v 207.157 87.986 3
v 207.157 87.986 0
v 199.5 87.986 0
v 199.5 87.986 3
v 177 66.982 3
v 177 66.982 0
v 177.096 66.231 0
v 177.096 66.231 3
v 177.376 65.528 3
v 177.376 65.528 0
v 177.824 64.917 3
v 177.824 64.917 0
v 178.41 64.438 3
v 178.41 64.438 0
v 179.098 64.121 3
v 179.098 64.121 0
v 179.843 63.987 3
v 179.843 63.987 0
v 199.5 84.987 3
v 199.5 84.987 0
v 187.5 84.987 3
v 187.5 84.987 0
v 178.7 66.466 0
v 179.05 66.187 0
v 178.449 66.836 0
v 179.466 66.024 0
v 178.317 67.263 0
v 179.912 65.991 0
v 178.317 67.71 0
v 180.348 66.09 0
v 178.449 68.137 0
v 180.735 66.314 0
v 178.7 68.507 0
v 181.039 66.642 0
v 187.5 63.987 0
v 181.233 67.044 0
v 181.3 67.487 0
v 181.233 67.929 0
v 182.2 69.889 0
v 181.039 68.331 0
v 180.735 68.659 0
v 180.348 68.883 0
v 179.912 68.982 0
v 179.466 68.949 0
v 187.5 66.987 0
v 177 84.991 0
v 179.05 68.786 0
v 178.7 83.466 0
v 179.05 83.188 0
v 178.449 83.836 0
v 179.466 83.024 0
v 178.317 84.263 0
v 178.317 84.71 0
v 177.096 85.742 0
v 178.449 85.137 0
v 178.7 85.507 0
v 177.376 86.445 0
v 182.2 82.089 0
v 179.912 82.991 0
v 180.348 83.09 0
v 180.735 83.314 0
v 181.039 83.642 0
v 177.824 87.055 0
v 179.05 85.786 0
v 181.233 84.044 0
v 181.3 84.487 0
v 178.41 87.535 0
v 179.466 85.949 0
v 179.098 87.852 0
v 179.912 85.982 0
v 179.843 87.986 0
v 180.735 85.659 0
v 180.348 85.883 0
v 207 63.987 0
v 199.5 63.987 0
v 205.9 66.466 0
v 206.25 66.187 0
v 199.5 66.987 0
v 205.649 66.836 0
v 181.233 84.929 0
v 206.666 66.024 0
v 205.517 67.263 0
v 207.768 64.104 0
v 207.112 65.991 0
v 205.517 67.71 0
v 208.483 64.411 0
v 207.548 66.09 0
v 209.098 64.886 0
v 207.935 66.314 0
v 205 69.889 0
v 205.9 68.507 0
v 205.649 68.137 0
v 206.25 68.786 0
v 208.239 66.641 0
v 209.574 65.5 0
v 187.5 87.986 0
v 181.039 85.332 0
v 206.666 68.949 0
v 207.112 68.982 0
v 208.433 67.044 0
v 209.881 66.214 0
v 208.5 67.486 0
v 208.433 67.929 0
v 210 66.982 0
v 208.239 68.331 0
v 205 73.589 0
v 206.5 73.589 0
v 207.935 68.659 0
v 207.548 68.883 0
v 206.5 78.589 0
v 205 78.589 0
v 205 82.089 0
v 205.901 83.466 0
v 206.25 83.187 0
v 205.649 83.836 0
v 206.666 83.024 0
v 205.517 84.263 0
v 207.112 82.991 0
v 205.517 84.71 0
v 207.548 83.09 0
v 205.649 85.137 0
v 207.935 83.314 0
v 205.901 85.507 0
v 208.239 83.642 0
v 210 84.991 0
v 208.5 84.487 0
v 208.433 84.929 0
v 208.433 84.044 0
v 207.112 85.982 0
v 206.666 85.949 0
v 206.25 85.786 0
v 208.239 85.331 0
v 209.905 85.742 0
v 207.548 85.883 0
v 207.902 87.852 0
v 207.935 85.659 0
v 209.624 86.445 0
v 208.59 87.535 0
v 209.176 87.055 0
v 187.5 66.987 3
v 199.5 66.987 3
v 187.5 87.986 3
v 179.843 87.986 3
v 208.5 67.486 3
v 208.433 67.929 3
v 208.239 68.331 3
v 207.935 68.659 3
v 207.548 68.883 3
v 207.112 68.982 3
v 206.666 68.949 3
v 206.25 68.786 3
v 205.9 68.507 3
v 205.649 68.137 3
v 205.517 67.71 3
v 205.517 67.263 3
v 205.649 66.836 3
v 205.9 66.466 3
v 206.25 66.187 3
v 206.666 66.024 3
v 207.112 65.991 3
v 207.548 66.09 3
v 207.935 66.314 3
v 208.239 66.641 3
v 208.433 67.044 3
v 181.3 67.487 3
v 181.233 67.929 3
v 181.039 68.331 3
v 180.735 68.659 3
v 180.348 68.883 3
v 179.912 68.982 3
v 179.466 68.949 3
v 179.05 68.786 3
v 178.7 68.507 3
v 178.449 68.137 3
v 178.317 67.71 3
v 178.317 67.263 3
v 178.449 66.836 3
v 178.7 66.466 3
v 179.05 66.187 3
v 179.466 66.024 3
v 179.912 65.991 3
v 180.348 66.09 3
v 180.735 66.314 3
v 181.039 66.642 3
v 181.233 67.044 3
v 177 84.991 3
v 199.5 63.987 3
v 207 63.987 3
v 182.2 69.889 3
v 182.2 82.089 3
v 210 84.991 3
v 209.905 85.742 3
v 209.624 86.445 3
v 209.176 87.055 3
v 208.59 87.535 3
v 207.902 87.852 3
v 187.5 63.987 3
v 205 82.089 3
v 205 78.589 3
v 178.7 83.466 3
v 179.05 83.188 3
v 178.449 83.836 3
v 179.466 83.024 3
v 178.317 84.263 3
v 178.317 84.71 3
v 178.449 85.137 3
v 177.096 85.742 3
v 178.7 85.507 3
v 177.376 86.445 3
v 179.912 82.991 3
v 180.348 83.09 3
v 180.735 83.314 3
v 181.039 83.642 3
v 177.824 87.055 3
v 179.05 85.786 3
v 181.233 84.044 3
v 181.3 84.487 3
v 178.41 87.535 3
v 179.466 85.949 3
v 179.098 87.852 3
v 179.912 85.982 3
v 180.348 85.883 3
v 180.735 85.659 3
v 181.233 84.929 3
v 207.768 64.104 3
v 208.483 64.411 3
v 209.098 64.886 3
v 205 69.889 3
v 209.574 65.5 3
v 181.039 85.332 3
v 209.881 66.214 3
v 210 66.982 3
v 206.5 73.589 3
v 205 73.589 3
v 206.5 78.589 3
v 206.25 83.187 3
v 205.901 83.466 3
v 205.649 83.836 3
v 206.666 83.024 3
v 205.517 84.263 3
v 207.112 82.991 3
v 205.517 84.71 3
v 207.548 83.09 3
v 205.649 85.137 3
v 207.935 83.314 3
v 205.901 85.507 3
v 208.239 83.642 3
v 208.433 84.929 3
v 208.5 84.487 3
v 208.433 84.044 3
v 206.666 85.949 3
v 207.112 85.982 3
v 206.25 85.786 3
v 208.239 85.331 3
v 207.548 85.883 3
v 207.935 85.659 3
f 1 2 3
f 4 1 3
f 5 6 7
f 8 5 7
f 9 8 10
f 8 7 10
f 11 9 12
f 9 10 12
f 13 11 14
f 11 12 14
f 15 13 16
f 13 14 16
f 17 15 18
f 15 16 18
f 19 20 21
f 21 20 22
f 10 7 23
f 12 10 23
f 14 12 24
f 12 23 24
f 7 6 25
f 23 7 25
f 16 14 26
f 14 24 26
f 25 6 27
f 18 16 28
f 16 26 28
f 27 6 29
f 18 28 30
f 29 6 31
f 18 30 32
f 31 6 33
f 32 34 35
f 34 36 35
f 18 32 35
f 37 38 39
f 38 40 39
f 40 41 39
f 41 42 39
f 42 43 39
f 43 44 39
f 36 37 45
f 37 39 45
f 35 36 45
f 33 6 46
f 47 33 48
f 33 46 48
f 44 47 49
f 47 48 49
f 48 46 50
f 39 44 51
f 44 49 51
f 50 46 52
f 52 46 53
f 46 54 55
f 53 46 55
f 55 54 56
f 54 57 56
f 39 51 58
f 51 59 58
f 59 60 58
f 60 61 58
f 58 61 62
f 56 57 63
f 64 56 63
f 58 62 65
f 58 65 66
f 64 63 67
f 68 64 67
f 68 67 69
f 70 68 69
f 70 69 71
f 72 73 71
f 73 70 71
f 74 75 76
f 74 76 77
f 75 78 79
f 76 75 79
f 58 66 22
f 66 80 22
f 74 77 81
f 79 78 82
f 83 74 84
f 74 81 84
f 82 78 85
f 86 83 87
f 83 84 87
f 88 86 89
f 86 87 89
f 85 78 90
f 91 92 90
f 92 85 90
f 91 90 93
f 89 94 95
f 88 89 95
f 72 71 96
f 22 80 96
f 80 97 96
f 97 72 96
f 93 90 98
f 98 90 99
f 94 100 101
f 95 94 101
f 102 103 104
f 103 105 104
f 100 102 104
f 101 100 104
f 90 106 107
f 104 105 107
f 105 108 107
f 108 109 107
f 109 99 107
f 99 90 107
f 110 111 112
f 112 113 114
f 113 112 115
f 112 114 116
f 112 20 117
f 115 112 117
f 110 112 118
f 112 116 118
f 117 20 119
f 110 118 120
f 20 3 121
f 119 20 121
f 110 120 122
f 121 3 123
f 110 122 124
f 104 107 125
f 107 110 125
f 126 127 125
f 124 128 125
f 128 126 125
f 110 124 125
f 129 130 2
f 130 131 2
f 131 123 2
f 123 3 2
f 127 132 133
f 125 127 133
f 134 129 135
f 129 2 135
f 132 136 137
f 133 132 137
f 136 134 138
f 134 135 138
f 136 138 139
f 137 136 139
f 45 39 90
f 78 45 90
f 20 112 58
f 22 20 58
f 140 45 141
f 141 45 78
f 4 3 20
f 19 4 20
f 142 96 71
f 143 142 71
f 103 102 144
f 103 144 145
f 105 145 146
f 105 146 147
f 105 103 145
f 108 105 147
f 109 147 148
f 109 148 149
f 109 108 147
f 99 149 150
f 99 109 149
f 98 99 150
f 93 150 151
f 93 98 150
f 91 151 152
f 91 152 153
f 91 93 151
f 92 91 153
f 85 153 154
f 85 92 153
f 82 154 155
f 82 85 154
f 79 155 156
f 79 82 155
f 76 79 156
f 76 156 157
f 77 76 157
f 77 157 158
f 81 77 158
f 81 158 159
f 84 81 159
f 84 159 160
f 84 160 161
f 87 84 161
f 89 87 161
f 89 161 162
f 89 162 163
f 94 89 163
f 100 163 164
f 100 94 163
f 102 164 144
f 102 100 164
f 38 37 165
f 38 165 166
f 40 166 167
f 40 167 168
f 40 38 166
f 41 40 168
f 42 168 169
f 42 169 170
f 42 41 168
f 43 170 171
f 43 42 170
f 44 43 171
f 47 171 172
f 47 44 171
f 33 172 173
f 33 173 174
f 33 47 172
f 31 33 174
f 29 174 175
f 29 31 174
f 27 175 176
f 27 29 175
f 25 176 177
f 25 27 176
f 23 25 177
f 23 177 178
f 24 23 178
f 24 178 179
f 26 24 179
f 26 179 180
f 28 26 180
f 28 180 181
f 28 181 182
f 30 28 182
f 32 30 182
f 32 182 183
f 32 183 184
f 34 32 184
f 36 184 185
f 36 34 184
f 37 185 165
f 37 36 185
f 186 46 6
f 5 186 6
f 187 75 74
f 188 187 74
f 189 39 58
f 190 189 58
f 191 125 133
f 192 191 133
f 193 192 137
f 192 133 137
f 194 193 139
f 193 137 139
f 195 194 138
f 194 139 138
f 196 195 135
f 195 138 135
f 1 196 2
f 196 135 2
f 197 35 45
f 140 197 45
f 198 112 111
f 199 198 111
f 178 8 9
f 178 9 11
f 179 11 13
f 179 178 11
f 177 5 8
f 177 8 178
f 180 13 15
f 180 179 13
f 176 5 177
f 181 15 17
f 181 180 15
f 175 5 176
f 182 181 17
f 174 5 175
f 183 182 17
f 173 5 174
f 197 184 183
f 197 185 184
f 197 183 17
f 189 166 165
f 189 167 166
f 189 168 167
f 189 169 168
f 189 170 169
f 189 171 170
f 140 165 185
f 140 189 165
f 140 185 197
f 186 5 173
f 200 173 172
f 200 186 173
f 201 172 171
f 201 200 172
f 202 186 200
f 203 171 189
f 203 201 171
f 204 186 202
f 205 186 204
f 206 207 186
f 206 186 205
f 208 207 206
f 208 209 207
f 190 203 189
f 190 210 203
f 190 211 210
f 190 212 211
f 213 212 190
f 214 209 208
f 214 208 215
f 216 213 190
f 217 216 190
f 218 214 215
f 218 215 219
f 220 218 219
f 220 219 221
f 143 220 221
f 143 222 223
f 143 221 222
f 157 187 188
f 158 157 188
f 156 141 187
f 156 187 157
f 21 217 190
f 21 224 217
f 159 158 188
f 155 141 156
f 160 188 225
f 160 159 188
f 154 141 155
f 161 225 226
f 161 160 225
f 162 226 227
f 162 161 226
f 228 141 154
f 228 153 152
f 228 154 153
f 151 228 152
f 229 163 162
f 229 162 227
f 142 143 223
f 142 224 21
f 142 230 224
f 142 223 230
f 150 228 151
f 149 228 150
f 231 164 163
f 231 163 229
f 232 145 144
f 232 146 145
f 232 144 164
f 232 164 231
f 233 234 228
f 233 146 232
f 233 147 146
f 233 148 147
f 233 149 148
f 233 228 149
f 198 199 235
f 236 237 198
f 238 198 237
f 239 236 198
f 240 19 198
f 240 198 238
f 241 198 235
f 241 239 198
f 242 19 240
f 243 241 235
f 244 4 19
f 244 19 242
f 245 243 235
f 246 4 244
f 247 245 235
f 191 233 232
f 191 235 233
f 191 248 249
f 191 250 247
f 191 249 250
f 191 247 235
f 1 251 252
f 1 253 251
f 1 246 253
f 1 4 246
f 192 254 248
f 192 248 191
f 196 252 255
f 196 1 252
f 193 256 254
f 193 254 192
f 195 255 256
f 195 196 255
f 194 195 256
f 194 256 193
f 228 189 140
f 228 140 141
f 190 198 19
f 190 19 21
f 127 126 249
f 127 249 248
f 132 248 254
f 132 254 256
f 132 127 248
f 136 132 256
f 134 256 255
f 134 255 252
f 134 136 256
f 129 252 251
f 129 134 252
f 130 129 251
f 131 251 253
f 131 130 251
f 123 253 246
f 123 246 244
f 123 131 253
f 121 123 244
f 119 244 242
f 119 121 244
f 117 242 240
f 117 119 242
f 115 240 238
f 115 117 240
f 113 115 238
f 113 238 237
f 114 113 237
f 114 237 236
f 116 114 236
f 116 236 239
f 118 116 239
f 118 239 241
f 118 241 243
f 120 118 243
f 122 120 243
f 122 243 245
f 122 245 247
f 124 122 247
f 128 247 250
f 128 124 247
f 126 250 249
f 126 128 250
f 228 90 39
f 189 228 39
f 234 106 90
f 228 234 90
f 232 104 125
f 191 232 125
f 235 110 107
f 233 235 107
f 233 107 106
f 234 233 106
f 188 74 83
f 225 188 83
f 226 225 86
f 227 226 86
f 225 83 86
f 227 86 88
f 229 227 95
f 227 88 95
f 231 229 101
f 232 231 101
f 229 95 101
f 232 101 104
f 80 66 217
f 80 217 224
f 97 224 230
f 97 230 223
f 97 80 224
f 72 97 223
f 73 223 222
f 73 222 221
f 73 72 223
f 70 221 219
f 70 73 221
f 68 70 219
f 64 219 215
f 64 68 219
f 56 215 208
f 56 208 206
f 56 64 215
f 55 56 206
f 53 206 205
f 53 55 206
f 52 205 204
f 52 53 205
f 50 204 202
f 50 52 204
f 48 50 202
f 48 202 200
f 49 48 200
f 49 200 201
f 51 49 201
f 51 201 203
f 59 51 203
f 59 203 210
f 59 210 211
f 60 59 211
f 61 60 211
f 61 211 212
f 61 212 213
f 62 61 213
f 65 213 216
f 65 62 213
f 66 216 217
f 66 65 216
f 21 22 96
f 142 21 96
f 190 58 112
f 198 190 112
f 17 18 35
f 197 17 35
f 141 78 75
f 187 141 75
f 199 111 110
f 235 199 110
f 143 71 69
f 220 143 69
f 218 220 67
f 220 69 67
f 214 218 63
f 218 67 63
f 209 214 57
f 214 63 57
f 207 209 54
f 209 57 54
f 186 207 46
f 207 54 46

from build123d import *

# Parameters (mm, degrees)
SKETCH_1_R      = 1.500000002
SKETCH_1_R_2    = 1.5
SKETCH_1_R_3    = 1.500000008
EXTRUDE_1_DEPTH = 3


with BuildPart() as part:
    # 草圖1 → 填料-伸長1 (new body)
    with BuildSketch(Plane.XY):
        with BuildLine():
            Line((199.500112684, 87.98631657), (199.500112684, 84.98651657))
            Line((199.500112684, 84.98651657), (187.500112684, 84.98651657))
            Line((187.500112684, 84.98651657), (187.500112684, 87.98631657))
            Line((187.500112684, 87.98631657), (179.842912684, 87.98631657))
            ThreePointArc((179.842912684, 87.98631657), (177.823916024, 87.055493072), (177.000112684, 84.99051657))
            Line((177.000112684, 84.99051657), (177.000112684, 66.98231657))
            ThreePointArc((177.000112684, 66.98231657), (177.823916024, 64.917340067), (179.842912684, 63.98651657))
            Line((179.842912684, 63.98651657), (187.500112684, 63.98651657))
            Line((187.500112684, 63.98651657), (187.500112684, 66.98651657))
            Line((187.500112684, 66.98651657), (199.500112684, 66.98651657))
            Line((199.500112684, 66.98651657), (199.500112684, 63.98651657))
            Line((199.500112684, 63.98651657), (207.000112684, 63.98651657))
            ThreePointArc((207.000112684, 63.98651657), (209.097709344, 64.885982101), (210.000112684, 66.98231657))
            Line((210.000112684, 66.98231657), (210.000112685, 84.99051657))
            ThreePointArc((210.000112685, 84.99051657), (209.176309345, 87.055493072), (207.157312685, 87.98631657))
            Line((207.157312685, 87.98631657), (199.500112684, 87.98631657))
        make_face()
        with Locations((179.800012686, 67.486516568)):
            Circle(SKETCH_1_R, mode=Mode.SUBTRACT)
        with Locations((179.800062678, 84.486566583)):
            Circle(SKETCH_1_R_2, mode=Mode.SUBTRACT)
        with Locations((207.00011268, 84.486516578)):
            Circle(SKETCH_1_R_3, mode=Mode.SUBTRACT)
        with Locations((207.000062688, 67.486466573)):
            Circle(SKETCH_1_R_2, mode=Mode.SUBTRACT)
        Polygon((205.000112684, 73.588516578), (205.000112684, 69.888516578), (182.200112684, 69.888516578), (182.200112684, 82.088516578), (205.000112684, 82.088516578), (205.000112684, 78.588516578), (206.500112684, 78.588516578), (206.500112684, 73.588516578), align=None, mode=Mode.SUBTRACT)
    extrude(amount=EXTRUDE_1_DEPTH)


solid = part.part
